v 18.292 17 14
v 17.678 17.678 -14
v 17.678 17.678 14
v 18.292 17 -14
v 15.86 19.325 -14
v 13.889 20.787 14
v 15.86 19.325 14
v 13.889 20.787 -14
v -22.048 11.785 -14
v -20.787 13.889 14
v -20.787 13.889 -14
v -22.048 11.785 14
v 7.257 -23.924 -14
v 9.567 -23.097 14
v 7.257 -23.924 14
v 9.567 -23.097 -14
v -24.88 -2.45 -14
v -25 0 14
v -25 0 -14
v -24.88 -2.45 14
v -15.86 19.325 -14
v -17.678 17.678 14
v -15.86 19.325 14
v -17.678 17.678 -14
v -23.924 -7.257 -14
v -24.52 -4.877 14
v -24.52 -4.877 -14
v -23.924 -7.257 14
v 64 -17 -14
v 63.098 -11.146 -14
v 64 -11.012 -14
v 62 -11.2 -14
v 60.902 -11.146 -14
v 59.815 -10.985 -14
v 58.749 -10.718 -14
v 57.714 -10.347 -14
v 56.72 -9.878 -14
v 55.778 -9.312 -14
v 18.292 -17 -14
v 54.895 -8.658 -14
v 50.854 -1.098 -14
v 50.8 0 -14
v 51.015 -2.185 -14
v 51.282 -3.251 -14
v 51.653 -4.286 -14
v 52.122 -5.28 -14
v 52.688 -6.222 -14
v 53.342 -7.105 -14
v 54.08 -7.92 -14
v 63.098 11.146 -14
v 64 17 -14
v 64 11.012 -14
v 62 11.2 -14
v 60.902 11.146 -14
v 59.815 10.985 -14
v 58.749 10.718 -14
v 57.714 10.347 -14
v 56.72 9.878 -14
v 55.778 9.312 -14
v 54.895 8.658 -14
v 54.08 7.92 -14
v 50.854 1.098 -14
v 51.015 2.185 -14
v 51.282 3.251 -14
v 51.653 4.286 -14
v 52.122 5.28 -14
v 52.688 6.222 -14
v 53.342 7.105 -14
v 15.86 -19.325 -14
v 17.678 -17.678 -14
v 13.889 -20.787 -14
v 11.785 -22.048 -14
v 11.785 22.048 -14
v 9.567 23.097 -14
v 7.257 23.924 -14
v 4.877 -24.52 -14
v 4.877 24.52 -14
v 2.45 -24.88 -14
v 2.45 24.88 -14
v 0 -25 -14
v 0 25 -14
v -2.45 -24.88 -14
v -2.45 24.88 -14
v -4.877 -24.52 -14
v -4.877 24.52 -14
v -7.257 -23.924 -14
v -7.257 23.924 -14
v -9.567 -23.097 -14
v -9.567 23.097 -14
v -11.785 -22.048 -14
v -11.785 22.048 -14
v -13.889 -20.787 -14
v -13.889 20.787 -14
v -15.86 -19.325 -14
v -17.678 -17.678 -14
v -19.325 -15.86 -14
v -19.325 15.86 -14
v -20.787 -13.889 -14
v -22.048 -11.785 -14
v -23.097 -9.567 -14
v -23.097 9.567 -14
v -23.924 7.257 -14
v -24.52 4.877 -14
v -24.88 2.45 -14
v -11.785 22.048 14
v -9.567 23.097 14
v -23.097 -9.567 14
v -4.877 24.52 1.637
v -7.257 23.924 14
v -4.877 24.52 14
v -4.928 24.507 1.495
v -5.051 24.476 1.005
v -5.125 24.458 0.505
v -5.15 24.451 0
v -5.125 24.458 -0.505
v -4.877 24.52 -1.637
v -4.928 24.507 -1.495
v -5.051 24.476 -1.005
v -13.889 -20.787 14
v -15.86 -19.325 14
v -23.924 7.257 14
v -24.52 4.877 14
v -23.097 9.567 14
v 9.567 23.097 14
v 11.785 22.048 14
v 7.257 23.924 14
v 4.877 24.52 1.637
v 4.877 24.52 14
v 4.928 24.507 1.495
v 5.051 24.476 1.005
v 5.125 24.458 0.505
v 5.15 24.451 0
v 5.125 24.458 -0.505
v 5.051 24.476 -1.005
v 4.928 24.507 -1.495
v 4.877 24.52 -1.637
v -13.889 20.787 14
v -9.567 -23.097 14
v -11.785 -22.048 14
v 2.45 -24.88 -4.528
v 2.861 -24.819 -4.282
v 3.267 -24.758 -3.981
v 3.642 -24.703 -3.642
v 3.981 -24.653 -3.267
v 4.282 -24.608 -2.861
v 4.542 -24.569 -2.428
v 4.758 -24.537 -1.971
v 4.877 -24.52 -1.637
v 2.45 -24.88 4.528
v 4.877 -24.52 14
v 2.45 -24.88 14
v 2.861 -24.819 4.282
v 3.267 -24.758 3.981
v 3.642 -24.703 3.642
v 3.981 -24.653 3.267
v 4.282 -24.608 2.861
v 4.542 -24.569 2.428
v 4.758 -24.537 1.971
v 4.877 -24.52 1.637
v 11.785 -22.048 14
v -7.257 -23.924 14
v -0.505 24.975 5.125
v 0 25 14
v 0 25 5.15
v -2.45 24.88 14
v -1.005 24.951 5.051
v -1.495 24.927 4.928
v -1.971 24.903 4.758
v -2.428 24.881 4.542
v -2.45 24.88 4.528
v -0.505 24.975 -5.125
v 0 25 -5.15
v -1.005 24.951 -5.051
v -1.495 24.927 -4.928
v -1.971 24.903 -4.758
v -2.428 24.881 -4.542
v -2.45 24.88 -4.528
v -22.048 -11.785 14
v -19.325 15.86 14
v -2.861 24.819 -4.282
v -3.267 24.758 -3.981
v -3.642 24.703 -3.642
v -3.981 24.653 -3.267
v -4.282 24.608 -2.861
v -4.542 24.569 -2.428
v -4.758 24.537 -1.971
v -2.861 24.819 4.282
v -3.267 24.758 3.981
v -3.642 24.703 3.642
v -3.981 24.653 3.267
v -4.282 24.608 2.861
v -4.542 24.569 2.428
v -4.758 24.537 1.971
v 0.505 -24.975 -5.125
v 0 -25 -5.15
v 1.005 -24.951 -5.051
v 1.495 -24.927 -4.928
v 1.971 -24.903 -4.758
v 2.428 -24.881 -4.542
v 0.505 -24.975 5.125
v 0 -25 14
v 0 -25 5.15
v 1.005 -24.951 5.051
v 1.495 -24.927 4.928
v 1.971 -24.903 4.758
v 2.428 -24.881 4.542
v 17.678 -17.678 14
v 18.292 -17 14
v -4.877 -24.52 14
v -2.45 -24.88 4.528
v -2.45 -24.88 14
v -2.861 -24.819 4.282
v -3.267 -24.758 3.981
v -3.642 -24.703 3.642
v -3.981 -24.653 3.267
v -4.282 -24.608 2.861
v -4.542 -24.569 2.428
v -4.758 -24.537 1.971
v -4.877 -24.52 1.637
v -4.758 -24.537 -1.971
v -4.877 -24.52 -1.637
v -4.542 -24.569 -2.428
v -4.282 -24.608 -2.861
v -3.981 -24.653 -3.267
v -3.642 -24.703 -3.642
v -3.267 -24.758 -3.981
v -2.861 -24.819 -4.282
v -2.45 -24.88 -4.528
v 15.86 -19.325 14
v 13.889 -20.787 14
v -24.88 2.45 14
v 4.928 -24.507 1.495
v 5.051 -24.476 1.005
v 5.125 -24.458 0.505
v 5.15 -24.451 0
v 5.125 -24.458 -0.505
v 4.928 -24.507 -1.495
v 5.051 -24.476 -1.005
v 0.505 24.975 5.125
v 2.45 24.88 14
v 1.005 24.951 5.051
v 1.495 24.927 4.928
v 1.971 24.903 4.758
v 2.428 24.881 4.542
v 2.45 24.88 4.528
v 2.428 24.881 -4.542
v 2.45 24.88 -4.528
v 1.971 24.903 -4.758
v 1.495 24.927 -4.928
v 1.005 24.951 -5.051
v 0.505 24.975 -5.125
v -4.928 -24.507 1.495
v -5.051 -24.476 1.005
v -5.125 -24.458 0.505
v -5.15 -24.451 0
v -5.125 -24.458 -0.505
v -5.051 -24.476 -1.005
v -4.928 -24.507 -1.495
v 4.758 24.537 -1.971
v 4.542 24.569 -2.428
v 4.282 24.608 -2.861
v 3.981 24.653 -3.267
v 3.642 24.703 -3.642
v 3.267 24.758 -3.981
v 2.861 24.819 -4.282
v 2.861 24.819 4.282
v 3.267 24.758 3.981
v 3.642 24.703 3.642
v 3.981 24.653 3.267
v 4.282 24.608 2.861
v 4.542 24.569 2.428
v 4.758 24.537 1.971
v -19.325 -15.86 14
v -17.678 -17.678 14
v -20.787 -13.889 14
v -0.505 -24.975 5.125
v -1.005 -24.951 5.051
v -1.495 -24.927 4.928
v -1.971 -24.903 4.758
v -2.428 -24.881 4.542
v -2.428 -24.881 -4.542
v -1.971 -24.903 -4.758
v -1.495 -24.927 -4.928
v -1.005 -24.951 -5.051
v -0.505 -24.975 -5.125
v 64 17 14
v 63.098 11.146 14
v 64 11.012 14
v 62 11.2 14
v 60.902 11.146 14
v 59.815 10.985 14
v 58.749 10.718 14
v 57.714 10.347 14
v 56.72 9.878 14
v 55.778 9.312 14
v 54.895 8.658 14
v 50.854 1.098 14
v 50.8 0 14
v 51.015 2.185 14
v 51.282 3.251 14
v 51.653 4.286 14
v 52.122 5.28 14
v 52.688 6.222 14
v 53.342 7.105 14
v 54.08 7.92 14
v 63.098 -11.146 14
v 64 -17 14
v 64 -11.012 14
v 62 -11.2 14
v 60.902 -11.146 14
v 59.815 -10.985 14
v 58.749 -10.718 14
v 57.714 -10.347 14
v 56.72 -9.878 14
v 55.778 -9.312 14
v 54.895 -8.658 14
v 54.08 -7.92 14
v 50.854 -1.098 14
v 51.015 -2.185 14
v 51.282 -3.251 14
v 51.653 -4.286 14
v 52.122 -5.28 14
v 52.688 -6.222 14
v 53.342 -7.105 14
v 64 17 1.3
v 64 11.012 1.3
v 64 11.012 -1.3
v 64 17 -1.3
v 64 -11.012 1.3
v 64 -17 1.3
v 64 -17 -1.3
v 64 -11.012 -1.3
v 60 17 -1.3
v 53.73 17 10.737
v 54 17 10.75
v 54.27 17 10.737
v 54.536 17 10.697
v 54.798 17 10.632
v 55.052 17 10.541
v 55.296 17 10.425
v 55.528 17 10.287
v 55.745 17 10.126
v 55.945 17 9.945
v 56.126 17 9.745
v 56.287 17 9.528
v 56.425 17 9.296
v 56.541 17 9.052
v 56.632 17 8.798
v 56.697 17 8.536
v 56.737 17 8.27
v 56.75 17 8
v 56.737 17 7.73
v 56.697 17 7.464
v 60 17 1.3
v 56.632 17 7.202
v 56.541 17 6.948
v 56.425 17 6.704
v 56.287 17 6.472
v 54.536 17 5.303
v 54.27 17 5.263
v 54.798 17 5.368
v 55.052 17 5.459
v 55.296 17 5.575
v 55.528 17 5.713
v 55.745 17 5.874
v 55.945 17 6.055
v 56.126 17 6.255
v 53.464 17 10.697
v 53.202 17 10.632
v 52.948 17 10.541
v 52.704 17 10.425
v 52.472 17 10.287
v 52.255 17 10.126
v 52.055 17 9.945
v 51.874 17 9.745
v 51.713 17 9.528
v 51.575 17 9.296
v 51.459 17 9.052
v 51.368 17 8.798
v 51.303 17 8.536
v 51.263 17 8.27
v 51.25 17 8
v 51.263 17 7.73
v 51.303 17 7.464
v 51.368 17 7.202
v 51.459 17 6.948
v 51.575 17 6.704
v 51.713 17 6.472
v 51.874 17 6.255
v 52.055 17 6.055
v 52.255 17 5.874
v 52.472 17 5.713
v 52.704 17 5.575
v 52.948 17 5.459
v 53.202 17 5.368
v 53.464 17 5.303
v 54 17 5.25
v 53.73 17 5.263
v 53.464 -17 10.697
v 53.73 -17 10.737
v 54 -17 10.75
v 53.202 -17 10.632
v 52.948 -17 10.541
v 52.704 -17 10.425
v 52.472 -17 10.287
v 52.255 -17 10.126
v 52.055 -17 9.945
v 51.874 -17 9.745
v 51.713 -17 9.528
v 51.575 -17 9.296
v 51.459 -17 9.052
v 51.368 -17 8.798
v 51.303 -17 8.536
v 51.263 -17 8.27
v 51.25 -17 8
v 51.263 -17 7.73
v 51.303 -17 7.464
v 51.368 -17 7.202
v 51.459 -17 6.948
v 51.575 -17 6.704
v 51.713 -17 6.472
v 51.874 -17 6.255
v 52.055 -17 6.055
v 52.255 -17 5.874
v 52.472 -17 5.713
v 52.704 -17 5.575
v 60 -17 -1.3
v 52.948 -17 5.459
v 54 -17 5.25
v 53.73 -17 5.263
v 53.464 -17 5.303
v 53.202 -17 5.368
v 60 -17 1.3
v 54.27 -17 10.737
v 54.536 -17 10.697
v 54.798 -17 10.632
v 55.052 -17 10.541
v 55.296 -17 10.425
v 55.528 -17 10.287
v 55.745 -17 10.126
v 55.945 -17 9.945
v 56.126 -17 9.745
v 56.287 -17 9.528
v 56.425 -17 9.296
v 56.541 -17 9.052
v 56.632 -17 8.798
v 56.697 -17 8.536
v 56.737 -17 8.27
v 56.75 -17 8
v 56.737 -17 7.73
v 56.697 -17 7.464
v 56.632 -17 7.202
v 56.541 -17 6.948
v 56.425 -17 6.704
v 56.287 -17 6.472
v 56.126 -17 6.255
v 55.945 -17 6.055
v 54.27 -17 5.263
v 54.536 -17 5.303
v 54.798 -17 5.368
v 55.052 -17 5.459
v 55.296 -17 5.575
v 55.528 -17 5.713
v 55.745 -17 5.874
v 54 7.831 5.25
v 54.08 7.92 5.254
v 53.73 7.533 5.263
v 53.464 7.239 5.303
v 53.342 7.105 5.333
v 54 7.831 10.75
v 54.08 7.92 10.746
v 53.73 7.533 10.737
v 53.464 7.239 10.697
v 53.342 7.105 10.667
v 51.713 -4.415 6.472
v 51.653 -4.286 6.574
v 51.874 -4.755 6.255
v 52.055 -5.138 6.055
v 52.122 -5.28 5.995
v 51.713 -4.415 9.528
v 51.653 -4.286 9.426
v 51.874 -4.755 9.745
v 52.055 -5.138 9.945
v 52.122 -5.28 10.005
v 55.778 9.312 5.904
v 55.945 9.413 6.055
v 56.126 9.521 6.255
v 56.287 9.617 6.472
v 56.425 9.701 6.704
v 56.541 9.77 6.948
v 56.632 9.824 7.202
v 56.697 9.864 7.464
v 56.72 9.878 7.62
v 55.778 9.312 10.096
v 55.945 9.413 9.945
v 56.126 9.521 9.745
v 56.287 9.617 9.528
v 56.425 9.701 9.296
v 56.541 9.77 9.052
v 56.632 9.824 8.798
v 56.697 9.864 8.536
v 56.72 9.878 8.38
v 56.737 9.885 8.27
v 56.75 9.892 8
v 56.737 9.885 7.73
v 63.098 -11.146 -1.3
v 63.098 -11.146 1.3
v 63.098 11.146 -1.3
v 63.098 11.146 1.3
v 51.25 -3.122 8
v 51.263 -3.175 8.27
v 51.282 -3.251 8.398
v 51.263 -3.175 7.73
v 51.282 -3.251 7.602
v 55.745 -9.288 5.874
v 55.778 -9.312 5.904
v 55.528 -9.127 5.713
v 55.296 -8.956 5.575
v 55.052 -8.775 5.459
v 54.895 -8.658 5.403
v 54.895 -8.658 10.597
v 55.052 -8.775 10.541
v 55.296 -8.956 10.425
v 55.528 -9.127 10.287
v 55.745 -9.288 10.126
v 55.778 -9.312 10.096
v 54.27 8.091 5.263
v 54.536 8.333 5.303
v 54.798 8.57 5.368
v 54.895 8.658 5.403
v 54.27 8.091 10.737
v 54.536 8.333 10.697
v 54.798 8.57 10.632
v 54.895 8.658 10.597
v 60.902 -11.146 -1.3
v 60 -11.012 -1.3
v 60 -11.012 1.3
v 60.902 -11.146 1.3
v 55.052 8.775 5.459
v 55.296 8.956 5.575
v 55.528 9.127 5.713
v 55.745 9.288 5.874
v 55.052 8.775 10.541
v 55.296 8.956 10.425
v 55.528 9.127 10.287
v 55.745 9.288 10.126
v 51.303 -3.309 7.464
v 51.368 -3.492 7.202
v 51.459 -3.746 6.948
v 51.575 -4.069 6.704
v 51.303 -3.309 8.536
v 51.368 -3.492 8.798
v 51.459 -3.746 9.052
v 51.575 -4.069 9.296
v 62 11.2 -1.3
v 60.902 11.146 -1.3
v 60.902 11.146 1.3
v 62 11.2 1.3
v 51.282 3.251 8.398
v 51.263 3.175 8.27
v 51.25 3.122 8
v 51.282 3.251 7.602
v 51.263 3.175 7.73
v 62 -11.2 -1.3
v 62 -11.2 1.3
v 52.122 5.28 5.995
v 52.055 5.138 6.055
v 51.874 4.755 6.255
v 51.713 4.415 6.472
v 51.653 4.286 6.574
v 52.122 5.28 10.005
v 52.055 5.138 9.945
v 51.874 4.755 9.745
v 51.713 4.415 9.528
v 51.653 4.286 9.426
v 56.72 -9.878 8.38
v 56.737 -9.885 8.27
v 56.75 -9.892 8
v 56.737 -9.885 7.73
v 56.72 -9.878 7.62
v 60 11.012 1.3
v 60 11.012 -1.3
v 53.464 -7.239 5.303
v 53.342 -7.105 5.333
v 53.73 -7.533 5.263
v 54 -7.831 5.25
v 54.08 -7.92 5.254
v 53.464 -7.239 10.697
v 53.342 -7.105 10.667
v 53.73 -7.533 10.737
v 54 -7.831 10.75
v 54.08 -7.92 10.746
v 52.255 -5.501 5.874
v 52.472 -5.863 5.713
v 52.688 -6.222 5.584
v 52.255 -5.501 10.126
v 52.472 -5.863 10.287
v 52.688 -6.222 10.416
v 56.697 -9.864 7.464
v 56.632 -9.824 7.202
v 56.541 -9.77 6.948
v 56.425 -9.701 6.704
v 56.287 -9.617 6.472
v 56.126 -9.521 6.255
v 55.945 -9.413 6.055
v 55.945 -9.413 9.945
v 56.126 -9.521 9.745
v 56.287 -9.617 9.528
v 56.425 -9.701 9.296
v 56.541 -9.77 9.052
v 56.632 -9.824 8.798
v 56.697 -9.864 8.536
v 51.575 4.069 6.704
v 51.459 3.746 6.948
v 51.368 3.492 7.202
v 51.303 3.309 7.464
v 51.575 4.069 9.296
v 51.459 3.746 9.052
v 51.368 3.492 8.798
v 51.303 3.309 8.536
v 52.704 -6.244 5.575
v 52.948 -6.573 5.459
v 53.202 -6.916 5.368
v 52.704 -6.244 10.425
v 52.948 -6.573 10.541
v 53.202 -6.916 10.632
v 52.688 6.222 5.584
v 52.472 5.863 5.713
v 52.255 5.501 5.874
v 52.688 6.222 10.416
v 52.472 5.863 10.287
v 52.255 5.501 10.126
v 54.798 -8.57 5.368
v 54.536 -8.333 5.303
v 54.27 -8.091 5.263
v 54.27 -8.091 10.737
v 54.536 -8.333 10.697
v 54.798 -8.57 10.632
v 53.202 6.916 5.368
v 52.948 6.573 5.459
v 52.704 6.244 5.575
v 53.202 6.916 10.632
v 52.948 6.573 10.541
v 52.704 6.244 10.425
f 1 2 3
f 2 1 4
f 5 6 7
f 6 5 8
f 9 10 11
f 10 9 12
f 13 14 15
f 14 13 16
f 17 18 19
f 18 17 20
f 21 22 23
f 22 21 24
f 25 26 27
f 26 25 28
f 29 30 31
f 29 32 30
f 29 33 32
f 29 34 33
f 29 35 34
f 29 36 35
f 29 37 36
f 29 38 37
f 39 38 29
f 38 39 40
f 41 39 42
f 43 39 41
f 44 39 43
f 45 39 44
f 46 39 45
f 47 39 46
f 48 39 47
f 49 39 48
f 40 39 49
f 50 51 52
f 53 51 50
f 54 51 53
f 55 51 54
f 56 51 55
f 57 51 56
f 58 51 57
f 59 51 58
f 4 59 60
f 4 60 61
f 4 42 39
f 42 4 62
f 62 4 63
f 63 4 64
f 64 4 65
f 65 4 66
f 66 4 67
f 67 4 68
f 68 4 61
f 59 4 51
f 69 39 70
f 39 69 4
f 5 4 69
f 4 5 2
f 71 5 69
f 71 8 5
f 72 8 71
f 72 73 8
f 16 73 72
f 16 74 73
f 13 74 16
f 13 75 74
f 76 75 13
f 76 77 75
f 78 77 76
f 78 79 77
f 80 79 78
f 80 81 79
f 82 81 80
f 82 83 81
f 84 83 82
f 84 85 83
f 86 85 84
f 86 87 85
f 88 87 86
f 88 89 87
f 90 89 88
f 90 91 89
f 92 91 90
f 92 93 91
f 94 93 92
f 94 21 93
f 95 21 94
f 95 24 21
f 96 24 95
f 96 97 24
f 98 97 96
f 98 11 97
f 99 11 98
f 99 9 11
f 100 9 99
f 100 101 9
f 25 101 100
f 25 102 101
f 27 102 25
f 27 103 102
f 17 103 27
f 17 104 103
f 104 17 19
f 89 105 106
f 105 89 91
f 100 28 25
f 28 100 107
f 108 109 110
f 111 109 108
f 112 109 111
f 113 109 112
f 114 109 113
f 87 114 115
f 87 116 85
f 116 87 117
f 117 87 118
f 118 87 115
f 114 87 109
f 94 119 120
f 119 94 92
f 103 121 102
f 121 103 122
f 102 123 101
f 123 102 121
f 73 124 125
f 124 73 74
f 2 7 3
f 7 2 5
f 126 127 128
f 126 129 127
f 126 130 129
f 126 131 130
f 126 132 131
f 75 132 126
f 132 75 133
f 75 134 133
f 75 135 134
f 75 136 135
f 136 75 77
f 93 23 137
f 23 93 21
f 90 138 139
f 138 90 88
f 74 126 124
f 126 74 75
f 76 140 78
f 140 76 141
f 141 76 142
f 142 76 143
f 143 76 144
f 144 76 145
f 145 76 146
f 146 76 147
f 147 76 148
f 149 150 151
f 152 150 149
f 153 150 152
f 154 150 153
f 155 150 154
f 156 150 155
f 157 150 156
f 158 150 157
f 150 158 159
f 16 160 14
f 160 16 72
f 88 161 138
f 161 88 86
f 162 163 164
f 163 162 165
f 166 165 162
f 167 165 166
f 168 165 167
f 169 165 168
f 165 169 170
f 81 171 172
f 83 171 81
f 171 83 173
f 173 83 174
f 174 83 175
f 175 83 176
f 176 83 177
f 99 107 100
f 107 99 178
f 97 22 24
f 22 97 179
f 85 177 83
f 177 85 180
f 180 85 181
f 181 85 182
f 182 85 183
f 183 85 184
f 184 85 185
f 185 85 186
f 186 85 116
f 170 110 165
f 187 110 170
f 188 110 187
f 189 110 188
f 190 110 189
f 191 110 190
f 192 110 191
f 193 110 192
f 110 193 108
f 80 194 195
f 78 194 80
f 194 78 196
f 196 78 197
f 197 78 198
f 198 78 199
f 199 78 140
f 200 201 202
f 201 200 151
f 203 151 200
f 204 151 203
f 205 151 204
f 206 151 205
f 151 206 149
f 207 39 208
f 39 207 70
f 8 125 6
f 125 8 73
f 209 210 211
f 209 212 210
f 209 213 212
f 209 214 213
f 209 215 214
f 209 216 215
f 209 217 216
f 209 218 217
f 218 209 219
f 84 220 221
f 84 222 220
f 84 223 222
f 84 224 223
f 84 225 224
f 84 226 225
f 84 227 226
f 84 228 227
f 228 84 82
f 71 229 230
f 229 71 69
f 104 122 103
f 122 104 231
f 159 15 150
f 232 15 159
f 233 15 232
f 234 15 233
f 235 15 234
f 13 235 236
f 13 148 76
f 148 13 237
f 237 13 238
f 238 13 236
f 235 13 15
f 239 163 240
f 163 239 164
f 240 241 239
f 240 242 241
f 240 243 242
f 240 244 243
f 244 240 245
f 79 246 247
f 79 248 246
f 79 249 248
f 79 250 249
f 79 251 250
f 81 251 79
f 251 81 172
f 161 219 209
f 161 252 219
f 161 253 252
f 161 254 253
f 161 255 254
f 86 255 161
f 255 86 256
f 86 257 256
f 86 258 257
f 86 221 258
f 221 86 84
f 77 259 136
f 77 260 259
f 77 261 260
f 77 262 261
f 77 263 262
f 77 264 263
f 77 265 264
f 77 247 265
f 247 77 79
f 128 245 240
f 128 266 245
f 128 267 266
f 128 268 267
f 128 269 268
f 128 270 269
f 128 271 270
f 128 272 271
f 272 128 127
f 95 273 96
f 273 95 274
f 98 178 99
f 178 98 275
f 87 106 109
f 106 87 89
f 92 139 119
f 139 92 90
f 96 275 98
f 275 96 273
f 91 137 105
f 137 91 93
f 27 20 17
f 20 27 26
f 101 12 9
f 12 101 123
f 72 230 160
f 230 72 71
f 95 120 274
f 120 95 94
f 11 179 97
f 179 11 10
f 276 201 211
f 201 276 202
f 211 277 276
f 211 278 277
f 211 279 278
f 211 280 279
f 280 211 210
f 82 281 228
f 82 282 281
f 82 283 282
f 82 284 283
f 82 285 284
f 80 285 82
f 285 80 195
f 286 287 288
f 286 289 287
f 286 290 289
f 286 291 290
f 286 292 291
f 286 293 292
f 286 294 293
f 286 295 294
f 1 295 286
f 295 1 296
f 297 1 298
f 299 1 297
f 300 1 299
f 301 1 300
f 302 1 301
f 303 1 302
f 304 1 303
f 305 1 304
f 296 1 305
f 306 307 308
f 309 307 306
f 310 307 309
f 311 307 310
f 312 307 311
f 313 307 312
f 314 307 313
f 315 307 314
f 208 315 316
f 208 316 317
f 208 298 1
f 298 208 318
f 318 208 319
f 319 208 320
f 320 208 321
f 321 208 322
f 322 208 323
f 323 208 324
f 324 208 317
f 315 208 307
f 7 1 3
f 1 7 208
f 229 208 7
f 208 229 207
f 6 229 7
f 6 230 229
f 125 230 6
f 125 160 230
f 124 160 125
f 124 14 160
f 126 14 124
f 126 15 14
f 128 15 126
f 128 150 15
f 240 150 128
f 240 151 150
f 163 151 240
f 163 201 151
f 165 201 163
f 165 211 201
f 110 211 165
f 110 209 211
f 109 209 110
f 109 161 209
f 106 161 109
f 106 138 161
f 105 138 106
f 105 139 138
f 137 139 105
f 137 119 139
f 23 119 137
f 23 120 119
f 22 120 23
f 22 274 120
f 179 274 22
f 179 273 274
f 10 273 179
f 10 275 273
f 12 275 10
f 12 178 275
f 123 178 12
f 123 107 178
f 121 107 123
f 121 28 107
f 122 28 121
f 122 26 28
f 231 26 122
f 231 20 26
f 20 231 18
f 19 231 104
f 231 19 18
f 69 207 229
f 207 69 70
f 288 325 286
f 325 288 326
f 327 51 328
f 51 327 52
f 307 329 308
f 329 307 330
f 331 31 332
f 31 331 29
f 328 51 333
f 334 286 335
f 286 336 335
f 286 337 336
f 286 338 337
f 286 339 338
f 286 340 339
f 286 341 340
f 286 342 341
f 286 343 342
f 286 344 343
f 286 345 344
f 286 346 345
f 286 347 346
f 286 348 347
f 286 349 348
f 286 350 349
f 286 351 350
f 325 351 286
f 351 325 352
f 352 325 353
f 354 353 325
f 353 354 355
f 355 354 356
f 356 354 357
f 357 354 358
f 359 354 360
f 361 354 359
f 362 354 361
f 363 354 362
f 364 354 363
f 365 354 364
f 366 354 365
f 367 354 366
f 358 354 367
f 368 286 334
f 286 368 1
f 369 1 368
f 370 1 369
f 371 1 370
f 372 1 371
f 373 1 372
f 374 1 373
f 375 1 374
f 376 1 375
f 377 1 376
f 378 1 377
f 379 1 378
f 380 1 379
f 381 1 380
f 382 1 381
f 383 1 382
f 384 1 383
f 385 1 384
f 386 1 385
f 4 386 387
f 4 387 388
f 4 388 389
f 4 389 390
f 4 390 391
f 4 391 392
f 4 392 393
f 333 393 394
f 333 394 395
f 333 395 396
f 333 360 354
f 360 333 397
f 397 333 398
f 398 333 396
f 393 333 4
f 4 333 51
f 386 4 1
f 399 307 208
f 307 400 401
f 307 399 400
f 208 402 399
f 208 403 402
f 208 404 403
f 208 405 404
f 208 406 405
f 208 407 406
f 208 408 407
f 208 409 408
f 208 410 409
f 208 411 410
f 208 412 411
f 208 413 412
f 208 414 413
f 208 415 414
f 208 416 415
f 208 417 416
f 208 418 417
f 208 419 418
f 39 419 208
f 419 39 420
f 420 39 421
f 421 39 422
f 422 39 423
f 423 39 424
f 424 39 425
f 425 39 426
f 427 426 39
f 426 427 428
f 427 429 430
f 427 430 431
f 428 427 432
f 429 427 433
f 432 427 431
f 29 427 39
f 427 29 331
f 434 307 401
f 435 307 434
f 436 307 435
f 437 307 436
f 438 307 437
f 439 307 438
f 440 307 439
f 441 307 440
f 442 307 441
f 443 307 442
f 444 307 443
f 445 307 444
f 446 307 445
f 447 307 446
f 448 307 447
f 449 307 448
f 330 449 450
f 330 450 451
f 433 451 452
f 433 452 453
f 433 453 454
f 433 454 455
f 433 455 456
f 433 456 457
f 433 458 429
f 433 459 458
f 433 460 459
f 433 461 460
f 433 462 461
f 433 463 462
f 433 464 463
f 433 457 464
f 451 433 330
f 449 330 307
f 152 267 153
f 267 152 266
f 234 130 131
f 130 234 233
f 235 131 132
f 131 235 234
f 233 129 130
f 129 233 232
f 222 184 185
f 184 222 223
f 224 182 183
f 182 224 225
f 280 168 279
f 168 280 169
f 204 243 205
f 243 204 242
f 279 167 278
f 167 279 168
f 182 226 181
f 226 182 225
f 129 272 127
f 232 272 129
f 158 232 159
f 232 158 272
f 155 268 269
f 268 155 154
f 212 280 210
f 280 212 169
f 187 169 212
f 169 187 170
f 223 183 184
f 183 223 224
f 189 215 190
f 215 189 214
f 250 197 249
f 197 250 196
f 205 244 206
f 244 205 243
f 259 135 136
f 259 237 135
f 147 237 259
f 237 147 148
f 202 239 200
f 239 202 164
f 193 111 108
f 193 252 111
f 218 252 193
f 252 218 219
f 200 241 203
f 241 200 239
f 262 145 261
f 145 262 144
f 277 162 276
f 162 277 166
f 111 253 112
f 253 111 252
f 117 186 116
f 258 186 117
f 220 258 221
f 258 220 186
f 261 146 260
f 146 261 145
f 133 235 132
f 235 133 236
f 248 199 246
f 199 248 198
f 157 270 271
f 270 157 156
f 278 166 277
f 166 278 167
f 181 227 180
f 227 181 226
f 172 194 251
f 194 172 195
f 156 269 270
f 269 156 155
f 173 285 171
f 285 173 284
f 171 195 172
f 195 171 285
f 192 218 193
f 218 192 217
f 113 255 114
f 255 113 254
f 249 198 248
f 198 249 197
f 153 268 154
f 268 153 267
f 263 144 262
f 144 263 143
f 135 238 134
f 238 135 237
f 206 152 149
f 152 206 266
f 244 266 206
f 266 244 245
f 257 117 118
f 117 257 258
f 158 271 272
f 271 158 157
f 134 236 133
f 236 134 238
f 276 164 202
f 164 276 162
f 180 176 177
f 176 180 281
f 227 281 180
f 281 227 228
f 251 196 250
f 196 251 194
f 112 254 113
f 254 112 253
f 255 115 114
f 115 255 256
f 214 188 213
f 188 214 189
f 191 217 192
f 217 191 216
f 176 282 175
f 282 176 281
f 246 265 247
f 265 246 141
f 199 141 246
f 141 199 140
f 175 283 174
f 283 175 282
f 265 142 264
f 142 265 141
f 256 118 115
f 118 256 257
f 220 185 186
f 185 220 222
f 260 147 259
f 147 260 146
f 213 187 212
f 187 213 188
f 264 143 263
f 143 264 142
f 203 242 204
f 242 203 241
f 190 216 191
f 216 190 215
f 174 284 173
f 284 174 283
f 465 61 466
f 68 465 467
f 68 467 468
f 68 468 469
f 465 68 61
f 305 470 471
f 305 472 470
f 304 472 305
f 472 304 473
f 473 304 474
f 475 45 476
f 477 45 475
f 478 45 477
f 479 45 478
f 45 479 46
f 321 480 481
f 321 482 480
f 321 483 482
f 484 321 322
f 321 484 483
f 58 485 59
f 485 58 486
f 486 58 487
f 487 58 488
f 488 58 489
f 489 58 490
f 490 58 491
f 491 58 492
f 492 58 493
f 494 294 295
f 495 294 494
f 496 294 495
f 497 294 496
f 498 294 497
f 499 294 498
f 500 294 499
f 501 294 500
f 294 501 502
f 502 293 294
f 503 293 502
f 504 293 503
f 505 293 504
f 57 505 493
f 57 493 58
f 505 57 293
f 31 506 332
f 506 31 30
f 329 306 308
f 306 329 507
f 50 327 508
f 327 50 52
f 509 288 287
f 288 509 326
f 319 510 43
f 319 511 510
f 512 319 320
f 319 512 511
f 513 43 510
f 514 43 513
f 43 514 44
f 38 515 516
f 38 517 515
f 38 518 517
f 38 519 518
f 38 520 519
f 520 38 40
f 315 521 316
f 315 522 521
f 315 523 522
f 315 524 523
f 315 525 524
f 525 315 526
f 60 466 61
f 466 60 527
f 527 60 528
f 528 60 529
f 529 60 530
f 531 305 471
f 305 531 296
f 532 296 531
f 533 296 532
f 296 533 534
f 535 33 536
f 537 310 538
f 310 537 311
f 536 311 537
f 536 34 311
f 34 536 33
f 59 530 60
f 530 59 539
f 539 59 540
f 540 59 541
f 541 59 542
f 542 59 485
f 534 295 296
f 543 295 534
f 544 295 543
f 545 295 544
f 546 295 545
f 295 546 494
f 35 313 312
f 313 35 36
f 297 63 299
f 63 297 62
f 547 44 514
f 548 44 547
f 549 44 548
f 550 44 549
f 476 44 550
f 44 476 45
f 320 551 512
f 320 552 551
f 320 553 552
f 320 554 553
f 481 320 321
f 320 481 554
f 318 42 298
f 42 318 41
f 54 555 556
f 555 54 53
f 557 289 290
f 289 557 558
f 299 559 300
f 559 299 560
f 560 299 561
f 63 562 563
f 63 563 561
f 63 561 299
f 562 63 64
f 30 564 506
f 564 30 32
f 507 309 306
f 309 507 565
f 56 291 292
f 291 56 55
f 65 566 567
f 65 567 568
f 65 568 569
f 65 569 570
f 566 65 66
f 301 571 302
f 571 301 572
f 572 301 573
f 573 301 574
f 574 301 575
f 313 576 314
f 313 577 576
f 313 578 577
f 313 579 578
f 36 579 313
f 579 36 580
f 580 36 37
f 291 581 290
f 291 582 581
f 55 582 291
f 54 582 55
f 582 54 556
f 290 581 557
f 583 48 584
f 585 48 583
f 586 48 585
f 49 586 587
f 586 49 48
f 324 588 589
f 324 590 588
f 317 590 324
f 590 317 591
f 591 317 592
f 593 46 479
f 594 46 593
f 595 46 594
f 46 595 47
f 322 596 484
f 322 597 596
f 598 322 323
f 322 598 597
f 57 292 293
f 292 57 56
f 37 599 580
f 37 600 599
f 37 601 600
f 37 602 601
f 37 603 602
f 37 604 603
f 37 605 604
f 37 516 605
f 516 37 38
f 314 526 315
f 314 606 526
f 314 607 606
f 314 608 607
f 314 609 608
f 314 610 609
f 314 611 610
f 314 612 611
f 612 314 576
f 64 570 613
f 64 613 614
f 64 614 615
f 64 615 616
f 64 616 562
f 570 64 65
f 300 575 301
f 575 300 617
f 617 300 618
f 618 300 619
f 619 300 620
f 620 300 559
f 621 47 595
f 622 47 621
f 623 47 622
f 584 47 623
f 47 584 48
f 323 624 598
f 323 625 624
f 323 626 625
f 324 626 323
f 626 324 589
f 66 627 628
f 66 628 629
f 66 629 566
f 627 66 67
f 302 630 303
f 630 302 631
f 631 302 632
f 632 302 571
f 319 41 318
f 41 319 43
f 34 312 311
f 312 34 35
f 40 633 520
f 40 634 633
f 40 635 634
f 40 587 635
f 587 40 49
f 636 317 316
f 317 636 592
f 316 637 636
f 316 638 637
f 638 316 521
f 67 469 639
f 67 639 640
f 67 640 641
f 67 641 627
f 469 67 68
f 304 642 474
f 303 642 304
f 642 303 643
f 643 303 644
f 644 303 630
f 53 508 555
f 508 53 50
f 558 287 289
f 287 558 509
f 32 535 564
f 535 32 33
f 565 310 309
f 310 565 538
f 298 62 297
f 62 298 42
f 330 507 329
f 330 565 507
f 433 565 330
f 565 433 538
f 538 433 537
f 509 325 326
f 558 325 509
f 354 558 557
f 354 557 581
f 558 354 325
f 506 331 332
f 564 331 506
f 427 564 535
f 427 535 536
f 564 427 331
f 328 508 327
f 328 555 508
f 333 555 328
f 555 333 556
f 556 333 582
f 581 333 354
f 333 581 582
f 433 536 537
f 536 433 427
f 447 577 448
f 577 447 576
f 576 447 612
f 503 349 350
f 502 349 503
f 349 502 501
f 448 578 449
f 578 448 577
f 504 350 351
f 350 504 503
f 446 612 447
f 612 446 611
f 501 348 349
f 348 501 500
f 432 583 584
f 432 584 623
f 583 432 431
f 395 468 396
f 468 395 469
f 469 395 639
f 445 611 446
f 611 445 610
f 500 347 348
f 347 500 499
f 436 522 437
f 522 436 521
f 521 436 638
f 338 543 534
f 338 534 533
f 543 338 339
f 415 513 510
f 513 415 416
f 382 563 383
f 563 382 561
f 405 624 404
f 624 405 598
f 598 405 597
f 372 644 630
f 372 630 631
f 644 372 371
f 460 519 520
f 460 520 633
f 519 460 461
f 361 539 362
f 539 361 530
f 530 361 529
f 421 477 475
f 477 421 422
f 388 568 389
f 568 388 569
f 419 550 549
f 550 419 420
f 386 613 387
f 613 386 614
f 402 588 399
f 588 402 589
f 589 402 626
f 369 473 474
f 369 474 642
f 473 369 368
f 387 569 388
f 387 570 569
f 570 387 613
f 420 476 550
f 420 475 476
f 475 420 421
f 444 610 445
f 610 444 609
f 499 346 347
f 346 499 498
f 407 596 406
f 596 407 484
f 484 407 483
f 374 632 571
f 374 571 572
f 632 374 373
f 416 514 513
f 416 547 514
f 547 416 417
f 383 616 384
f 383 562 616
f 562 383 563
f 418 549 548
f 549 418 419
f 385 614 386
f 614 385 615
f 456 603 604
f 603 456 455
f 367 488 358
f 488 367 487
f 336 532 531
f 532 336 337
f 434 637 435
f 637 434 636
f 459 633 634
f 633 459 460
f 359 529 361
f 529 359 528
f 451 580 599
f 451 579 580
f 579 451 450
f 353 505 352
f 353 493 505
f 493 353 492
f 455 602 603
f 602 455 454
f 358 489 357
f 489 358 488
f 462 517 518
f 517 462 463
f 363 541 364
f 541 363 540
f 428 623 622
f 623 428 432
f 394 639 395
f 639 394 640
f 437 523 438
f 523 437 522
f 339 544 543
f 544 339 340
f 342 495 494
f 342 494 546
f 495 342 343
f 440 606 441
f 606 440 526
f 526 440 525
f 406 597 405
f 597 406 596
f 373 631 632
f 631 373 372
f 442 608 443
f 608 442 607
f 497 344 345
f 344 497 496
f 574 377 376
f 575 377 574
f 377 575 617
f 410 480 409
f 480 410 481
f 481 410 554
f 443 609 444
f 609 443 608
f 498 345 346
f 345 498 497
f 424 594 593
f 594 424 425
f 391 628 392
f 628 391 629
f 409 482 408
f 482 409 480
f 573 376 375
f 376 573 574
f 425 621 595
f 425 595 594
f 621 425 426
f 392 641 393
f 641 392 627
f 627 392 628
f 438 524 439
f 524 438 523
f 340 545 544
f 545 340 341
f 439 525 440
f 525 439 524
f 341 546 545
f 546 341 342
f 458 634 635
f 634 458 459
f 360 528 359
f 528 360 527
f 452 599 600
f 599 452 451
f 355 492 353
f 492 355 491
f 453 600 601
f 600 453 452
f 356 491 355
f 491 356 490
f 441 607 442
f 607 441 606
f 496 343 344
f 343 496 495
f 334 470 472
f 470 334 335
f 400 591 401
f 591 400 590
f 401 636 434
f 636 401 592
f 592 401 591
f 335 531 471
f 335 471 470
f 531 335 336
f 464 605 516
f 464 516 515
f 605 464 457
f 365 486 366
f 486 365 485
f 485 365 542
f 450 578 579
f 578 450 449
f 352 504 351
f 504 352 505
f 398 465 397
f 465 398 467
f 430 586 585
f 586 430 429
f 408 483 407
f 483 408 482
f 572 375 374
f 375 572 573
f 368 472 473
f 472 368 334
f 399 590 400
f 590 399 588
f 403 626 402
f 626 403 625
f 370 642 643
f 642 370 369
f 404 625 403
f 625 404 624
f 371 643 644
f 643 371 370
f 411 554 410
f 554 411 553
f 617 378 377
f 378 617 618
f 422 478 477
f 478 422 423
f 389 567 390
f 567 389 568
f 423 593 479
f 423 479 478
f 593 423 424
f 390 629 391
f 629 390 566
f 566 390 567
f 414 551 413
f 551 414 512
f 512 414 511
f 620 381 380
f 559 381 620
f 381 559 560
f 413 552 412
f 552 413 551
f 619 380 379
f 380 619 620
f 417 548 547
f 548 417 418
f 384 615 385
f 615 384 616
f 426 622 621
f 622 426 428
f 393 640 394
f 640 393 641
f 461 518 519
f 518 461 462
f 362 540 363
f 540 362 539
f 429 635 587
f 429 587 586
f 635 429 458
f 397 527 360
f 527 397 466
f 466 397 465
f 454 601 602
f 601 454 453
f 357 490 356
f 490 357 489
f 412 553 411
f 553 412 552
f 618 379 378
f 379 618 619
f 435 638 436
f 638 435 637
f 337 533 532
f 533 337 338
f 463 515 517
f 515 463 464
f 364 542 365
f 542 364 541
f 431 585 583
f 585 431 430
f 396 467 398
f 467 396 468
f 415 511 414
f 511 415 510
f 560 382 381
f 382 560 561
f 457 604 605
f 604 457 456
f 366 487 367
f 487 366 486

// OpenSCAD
$fn=64;shaft=10.3;tube=22.4;m5=5.5;
difference(){union(){cylinder(h=28,d=50,center=true);translate([32,0,0])cube([64,34,28],center=true);}rotate([90,0,0])cylinder(h=80,d=shaft,center=true);translate([62,0,-20])cylinder(h=40,d=tube);translate([60,-30,-1.3])cube([30,60,2.6]);rotate([90,0,0])translate([54,8,0])cylinder(h=60,d=m5,center=true);}
